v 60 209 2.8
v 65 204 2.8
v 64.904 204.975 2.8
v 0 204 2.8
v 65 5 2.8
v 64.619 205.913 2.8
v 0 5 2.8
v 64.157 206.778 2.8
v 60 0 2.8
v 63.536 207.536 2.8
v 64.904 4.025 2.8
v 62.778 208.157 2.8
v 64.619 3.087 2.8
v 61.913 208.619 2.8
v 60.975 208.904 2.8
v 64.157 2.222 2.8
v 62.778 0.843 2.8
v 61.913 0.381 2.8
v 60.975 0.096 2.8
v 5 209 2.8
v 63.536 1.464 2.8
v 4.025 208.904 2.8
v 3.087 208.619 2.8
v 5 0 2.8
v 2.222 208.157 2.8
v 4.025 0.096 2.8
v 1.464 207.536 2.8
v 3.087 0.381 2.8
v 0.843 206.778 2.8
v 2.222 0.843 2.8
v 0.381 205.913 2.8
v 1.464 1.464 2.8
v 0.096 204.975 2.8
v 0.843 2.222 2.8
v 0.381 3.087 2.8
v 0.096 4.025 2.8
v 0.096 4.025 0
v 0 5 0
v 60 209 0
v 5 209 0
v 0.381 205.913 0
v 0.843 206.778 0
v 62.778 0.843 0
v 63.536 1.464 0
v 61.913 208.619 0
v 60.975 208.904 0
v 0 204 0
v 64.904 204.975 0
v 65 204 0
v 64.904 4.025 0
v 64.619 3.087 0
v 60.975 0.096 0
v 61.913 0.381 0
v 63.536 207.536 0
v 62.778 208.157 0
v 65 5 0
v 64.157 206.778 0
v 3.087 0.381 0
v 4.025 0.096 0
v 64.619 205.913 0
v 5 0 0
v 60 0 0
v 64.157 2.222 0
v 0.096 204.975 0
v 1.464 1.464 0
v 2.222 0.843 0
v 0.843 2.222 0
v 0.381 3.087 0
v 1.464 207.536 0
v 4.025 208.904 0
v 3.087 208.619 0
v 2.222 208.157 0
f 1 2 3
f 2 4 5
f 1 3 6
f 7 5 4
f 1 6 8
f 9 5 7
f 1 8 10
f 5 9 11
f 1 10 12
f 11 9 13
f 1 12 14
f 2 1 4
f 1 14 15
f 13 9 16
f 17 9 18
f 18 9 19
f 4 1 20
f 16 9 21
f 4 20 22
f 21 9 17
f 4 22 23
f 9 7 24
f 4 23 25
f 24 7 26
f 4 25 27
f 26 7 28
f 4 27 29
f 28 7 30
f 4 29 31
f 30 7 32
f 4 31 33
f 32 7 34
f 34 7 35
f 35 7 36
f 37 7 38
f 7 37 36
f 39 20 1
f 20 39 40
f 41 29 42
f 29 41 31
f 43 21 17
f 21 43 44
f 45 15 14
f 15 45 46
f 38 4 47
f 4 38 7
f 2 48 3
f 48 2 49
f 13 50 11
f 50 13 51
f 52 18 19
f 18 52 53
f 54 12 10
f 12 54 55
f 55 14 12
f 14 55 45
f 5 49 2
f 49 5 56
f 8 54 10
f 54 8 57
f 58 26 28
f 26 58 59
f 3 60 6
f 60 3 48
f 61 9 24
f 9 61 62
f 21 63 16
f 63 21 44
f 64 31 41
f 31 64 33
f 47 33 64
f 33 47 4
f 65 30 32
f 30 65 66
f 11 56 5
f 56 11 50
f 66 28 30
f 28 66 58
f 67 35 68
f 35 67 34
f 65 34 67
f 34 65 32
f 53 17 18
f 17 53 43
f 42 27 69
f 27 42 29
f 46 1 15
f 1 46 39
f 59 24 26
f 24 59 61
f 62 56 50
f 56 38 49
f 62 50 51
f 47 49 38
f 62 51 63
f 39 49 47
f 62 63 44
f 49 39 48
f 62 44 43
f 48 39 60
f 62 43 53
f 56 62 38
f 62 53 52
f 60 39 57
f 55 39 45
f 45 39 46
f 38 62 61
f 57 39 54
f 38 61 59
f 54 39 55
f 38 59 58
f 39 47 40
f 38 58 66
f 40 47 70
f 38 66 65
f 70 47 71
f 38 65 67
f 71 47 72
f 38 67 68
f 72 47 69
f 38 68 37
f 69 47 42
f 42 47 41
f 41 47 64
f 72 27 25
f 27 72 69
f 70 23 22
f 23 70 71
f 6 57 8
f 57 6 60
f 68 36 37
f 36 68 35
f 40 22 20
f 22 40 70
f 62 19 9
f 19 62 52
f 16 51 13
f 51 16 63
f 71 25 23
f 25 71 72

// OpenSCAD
// 机箱前面板 - B块 (65mm × 209mm × 2.8mm)
// 燕尾榫拼接 (凹槽)

// 参数
width = 65;      // 宽度 (mm)
height = 209;    // 高度 (mm)
thickness = 2.8; // 厚度 (mm)
corner_radius = 5;  // 倒角半径 (mm)

// 燕尾榫参数 (与A块匹配)
dovetail_width = 15;    // 燕尾宽度 (mm)
dovetail_depth = 6.2;   // 燕尾槽深度 (mm，比凸榫深0.2mm)
dovetail_angle = 45;    // 燕尾角度 (度)
dovetail_count = 4;     // 燕尾数量
tolerance = 0.35;        // 配合间隙 (mm)

// 计算燕尾实际尺寸
dovetail_offset = tan(dovetail_angle) * thickness;
dovetail_base_width = dovetail_width - 2 * dovetail_offset;

// 定位销参数
pin_radius = 1.8;       // 凹槽半径 (比凸销大0.3mm)
pin_height = 3;

// 圆角矩形模块
module rounded_rect(w, h, r, t) {
    hull() {
        translate([r, r, 0]) cylinder(h = t, r = r, $fn = 32);
        translate([w - r, r, 0]) cylinder(h = t, r = r, $fn = 32);
        translate([w - r, h - r, 0]) cylinder(h = t, r = r, $fn = 32);
        translate([r, h - r, 0]) cylinder(h = t, r = r, $fn = 32);
    }
}

// 单个燕尾凹槽
module dovetail_slot(y_pos) {
    half_width = dovetail_width / 2 + tolerance/2;
    half_offset = dovetail_offset / 2;
    base_half_width = half_width - half_offset;

    translate([-0.1, y_pos, 0])
    rotate([0, -90, 0])
    linear_extrude(height = dovetail_depth + 0.2, convexity = 3)
    polygon(points = [
        [0, -half_width],
        [0, half_width],
        [thickness, base_half_width + tolerance/2],
        [thickness, -base_half_width - tolerance/2]
    ]);
}

// 定位凹槽
module alignment_slot(y_pos) {
    translate([-0.5, y_pos, 0])
    rotate([0, -90, 0])
    cylinder(h = pin_height, r = pin_radius, $fn = 16);
}

// 创建主体
difference() {
    // 前面板主体
    color("LightGray") {
        rounded_rect(width, height, corner_radius, thickness);
    }

    // 燕尾凹槽
    color("DarkGray") {
        for (i = [0:dovetail_count-1]) {
            dovetail_slot(30 + (i + 1) * ((height - 60) / (dovetail_count + 1)));
        }
    }

    // 定位凹槽
    alignment_slot(15);
    alignment_slot(height - 15);
}

// 装配预览 (打印时可注释掉)
// color("LightGray", 0.3)
// translate([-dovetail_depth, 0, 0])
// import("front_panel_A_dovetail.stl");
